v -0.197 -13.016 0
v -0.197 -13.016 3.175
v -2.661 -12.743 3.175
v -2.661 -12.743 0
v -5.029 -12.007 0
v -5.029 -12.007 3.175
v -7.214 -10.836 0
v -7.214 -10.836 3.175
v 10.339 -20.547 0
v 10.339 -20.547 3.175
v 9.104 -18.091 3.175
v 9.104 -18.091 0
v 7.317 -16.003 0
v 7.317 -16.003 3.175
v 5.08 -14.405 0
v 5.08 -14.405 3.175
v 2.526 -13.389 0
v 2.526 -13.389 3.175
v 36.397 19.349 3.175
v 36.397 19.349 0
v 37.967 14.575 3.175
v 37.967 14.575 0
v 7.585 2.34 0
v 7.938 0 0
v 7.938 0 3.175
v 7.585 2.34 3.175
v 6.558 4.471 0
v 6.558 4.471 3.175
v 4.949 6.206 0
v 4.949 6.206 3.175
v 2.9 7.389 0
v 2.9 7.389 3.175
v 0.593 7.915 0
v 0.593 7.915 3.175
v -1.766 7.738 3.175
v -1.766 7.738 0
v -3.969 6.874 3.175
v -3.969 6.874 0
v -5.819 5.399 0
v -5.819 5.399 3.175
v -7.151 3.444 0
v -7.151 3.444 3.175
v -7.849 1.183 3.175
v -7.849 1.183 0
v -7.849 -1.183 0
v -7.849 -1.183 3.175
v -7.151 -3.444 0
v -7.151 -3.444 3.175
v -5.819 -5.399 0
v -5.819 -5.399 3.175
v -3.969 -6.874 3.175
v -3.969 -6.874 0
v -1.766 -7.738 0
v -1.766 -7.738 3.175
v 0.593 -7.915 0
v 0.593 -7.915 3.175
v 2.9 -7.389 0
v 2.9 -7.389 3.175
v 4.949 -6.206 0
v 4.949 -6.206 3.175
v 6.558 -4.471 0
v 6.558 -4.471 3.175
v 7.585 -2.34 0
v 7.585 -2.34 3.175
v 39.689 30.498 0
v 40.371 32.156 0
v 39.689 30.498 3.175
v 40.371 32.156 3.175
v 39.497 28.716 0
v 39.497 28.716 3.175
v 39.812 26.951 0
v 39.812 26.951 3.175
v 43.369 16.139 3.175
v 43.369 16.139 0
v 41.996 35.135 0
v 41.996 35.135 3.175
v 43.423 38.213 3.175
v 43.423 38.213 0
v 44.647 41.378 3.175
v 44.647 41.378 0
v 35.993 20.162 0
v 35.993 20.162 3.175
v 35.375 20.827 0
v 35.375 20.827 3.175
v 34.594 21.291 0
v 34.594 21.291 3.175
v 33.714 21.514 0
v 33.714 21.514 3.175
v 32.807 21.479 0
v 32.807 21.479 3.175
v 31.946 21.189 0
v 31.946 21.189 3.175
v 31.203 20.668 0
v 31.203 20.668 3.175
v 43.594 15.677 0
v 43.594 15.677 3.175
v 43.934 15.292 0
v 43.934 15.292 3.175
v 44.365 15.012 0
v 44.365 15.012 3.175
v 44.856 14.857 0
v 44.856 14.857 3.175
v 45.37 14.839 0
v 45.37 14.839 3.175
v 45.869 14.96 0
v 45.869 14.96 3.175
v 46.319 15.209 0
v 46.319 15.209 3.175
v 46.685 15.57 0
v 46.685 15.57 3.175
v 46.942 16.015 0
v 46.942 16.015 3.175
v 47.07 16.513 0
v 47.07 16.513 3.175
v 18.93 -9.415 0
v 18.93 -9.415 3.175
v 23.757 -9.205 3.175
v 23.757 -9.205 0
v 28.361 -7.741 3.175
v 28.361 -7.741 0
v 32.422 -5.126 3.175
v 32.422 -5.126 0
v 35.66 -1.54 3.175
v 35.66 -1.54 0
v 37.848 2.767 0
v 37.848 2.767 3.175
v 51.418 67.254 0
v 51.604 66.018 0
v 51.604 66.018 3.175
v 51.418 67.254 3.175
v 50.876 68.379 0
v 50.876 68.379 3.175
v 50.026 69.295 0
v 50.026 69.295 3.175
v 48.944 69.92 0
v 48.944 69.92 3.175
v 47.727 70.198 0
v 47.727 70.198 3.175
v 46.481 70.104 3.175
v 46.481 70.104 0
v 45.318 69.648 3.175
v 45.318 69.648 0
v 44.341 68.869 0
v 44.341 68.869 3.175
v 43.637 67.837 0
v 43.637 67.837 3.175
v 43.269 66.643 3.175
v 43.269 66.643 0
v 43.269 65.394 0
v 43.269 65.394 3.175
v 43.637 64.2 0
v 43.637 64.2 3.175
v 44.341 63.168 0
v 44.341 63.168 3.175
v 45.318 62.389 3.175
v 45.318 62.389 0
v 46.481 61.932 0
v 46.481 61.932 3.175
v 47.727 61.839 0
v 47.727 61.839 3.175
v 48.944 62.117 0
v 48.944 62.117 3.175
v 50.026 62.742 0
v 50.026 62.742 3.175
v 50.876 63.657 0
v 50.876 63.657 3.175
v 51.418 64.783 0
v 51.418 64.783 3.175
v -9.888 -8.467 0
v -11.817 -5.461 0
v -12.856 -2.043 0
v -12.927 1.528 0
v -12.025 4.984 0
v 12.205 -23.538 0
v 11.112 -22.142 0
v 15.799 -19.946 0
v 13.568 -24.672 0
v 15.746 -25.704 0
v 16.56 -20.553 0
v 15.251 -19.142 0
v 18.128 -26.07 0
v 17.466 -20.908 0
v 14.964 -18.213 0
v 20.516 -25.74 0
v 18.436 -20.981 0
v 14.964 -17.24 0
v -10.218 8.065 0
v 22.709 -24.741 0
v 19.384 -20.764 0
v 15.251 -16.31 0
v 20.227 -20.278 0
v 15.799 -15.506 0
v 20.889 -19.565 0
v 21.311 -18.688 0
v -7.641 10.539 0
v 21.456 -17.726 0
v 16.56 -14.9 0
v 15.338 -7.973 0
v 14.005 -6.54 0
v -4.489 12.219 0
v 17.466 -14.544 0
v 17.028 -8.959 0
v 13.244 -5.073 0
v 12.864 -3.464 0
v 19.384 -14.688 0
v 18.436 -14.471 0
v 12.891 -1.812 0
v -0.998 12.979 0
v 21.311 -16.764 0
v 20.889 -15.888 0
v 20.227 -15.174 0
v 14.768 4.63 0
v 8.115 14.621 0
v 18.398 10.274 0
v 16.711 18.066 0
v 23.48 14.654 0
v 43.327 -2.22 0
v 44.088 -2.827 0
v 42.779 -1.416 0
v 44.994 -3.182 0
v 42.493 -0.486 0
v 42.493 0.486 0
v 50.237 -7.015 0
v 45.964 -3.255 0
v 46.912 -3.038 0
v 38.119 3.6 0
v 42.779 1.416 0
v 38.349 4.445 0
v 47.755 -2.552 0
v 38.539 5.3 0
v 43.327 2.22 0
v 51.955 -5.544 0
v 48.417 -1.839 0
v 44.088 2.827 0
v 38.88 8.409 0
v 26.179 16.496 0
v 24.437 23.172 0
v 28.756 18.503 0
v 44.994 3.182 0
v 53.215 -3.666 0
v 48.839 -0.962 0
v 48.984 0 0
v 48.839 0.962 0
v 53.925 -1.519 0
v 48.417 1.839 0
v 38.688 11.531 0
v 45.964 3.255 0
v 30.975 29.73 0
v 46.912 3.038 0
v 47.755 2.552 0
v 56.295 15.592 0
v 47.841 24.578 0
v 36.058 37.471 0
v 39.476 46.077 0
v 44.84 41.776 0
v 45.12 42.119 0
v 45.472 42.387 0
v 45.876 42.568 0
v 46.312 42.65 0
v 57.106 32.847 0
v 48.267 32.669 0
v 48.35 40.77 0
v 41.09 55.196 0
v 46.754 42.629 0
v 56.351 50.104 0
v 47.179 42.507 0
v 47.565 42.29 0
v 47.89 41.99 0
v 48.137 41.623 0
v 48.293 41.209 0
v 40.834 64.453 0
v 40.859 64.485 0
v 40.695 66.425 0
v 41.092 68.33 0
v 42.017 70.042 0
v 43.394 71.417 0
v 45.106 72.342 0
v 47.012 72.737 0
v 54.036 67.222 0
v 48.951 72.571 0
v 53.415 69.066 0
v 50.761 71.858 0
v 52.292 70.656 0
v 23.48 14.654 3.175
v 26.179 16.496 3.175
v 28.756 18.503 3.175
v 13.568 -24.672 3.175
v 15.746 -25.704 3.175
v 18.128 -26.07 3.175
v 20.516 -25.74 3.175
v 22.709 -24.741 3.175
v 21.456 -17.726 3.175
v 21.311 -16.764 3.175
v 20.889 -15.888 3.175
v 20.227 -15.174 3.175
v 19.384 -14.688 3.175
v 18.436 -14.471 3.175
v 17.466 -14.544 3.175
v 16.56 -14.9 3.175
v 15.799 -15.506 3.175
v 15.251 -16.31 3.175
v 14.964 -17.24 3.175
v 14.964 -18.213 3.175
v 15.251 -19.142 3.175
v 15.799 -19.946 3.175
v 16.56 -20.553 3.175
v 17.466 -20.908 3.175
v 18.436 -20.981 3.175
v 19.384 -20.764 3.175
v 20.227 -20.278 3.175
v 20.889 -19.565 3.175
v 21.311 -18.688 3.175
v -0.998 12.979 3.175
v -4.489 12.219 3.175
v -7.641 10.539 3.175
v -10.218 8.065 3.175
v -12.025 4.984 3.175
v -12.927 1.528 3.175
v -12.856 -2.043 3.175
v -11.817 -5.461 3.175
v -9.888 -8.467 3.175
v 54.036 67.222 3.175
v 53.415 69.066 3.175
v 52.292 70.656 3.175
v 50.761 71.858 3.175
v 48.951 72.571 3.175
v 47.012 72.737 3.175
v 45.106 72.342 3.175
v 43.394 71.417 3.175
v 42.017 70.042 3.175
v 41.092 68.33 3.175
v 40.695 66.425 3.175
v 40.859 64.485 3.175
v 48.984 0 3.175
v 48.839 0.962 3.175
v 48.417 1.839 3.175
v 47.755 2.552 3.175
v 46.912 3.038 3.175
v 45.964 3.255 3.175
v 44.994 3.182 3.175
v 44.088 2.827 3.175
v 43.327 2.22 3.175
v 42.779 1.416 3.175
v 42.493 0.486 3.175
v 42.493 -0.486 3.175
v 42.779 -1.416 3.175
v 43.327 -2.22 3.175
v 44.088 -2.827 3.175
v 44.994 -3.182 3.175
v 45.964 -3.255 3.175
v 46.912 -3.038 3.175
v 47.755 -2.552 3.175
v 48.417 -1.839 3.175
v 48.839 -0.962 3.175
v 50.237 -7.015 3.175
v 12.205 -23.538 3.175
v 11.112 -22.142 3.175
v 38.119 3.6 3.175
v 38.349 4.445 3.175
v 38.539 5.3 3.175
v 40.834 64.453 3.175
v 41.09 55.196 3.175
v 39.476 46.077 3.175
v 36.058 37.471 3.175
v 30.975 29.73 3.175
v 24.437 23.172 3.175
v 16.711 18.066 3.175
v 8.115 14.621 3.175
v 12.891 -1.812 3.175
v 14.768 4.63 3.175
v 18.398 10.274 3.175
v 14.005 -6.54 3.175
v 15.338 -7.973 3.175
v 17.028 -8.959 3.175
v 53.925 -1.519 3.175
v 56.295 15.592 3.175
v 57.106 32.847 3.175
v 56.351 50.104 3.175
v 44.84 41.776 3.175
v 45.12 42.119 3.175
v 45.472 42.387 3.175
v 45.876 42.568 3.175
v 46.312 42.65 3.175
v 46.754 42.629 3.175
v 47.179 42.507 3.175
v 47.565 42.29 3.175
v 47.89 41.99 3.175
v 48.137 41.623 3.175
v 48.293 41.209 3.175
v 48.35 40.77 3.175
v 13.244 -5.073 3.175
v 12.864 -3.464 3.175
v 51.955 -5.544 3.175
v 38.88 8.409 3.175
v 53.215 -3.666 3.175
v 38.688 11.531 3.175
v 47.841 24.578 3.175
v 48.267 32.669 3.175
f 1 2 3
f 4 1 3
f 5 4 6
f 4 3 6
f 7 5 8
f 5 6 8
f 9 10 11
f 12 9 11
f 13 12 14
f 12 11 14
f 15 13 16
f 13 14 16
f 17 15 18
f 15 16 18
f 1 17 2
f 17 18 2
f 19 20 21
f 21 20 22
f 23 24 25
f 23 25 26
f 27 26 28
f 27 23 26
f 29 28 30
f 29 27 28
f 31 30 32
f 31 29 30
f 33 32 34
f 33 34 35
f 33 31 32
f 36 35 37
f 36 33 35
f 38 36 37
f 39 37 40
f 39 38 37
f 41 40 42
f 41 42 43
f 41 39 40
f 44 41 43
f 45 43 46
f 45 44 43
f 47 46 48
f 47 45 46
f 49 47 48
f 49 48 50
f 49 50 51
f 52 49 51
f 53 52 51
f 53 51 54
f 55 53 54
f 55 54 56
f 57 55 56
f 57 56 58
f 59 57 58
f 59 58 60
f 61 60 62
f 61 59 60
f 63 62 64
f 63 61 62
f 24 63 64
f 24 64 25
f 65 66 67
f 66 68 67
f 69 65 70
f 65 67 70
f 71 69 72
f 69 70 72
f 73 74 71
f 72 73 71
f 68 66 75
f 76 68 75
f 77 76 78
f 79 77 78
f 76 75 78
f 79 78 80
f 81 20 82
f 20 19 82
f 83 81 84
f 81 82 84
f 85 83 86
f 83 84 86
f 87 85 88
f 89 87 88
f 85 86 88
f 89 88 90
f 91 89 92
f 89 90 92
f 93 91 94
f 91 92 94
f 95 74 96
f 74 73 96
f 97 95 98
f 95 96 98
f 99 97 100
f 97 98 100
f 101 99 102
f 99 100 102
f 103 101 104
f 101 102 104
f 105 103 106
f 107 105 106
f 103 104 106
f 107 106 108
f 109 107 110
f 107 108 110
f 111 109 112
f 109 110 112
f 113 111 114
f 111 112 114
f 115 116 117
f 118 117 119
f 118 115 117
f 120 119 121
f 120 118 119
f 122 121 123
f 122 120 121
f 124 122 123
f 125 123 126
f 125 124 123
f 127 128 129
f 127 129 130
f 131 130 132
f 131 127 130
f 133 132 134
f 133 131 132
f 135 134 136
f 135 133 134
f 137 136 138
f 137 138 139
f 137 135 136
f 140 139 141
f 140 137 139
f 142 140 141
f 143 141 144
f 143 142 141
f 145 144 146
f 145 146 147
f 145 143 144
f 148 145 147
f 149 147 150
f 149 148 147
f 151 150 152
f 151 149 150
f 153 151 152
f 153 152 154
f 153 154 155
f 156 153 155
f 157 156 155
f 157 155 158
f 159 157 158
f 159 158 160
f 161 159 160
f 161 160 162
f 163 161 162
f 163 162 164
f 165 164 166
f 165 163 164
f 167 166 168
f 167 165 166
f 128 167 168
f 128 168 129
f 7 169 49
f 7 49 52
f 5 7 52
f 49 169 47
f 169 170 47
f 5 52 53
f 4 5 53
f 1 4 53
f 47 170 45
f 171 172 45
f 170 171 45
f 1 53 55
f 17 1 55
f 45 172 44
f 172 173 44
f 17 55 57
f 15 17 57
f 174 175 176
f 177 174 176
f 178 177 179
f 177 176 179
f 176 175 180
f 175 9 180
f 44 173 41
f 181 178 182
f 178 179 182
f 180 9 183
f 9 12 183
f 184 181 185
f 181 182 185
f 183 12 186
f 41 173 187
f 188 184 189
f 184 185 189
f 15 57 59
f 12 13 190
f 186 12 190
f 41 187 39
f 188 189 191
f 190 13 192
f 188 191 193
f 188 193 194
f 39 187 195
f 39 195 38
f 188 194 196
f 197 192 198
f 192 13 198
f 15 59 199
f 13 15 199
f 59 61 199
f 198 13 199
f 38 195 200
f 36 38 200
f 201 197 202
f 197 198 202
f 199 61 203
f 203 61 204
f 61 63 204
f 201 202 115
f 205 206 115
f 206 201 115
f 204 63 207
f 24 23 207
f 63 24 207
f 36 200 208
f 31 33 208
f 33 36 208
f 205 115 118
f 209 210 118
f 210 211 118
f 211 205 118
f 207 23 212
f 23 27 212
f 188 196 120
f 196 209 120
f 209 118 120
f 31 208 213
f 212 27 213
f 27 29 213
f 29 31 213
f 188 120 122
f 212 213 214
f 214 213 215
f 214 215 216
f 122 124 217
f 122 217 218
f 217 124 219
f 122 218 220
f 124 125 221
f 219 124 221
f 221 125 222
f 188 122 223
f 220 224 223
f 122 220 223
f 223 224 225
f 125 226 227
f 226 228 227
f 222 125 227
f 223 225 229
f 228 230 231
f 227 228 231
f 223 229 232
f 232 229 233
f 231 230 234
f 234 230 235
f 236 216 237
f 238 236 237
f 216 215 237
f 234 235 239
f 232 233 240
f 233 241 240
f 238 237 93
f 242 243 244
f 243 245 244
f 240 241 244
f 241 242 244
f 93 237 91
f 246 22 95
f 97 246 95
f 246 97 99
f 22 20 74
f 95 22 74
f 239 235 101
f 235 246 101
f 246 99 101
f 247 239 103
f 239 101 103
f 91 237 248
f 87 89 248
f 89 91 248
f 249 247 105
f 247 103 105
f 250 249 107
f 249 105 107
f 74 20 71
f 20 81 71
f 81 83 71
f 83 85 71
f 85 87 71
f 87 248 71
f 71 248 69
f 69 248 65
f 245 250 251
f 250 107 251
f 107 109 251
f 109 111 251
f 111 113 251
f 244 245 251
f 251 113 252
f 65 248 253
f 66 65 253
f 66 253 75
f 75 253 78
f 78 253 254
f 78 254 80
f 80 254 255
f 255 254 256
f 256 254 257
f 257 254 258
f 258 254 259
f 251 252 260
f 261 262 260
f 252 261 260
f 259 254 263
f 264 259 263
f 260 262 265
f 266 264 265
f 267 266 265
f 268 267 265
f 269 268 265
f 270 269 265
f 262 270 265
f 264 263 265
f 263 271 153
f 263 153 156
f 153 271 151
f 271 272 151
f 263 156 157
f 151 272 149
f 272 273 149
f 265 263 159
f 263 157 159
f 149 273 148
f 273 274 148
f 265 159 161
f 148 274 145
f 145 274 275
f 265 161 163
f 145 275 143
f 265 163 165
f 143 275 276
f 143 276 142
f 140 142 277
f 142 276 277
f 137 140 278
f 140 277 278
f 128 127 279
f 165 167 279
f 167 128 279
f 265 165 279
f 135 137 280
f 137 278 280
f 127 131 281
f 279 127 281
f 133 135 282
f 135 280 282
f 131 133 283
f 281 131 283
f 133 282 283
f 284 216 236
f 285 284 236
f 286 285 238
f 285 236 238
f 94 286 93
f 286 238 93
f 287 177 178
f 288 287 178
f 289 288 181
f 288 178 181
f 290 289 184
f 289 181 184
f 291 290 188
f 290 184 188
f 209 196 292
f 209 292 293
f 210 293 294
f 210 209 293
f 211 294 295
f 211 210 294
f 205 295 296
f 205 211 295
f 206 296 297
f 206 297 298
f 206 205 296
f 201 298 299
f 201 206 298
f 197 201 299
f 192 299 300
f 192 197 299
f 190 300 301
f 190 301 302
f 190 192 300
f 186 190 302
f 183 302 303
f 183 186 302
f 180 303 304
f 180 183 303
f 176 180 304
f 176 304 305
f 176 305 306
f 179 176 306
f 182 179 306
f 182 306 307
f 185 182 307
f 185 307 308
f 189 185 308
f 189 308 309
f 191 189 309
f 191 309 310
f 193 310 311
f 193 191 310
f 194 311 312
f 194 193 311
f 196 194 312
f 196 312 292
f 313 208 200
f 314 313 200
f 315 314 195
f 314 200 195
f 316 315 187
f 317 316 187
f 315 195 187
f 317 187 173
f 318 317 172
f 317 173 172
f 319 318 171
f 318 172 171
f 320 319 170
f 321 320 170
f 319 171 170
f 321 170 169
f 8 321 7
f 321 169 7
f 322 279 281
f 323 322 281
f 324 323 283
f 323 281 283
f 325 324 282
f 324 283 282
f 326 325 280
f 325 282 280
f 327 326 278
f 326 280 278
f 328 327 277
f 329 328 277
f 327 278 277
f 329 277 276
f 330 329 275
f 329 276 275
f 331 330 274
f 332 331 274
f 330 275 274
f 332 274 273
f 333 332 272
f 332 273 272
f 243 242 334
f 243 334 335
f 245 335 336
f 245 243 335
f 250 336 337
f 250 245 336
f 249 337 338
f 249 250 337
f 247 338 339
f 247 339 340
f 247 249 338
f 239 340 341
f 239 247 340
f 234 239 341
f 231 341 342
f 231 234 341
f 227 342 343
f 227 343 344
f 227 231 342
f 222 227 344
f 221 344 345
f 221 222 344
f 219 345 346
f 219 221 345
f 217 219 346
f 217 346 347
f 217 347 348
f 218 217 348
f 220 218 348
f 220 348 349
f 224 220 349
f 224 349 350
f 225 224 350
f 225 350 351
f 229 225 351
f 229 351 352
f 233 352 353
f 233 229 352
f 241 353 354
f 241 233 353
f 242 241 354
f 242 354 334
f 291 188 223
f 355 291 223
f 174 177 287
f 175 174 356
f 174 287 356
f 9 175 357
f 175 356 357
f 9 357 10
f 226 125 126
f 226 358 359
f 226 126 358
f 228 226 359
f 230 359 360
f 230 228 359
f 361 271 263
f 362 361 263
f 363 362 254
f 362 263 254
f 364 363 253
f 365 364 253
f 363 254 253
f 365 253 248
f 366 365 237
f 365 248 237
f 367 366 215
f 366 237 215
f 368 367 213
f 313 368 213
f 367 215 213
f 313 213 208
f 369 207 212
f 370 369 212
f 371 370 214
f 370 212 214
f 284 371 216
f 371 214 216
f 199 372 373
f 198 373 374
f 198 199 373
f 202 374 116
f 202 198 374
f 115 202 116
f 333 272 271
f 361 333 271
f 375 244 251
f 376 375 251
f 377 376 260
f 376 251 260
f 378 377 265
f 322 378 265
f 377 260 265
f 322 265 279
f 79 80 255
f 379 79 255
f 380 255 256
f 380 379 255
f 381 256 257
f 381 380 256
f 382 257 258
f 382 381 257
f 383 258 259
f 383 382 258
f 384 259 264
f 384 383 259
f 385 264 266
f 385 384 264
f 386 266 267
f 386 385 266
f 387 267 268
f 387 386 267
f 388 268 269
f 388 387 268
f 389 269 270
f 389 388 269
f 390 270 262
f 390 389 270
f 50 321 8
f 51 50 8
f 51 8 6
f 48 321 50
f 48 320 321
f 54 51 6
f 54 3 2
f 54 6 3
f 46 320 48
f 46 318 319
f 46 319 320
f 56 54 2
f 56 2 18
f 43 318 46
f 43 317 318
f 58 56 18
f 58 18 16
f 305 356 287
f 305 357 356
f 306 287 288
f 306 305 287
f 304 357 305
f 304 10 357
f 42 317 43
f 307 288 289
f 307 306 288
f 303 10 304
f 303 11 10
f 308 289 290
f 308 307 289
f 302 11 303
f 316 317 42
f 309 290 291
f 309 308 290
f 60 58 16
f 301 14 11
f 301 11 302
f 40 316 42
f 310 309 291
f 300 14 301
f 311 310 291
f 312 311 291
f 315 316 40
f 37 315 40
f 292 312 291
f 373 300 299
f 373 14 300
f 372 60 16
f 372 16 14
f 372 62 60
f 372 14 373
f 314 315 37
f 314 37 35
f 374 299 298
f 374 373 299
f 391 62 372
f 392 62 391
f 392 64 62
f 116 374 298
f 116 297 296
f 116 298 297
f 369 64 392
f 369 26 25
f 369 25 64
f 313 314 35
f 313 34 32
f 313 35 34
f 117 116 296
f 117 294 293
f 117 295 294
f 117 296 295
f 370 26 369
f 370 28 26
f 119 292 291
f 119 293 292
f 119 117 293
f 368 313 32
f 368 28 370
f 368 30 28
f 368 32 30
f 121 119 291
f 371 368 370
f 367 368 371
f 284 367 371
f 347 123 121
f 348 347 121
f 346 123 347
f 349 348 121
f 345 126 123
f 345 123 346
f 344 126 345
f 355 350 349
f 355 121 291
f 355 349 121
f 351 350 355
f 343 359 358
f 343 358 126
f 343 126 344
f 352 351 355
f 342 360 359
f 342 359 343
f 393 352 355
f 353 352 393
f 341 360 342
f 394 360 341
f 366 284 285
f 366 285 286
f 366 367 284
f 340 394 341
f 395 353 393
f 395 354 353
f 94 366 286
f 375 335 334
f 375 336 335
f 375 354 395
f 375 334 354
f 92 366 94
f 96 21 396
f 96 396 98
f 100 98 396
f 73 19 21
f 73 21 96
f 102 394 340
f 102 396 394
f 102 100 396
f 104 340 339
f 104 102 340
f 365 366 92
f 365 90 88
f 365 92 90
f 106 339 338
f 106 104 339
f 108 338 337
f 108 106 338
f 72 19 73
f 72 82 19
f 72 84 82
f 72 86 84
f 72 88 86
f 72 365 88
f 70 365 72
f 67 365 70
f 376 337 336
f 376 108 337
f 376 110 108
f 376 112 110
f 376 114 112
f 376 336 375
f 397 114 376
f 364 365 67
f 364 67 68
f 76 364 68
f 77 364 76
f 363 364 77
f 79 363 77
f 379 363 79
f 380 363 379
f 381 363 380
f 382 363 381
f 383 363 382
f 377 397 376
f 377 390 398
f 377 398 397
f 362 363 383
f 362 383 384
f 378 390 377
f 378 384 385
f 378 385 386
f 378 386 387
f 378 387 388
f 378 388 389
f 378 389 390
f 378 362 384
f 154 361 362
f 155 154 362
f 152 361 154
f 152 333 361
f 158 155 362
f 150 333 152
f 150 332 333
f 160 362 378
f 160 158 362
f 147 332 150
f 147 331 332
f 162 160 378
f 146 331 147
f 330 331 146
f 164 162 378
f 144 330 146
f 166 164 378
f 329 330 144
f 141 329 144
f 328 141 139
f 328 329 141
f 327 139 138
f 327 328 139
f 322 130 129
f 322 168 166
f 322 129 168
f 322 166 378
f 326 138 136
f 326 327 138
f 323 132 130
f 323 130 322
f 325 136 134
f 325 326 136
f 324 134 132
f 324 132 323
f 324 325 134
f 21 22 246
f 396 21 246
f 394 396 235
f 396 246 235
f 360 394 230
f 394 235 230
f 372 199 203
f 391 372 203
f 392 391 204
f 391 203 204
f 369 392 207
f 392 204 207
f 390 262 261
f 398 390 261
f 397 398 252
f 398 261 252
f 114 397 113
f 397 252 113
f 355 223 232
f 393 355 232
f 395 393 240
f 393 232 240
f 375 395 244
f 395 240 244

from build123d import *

# Parameters (mm, degrees)
SKETCH2_R           = 7.9375
SKETCH2_R_2         = 3.2639
SKETCH2_R_3         = 4.191
BOSS_EXTRUDE1_DEPTH = 3.175
FILLET3_R           = 1.905
FILLET4_R           = 6.35
BOSS_EXTRUDE2_START = -3.175
BOSS_EXTRUDE2_DEPTH = 3.175
CUT_EXTRUDE1_DEPTH  = 12.065
FILLET5_R           = 3.175
CUT_EXTRUDE2_DEPTH  = 93.540316773


with BuildPart() as part:
    # Sketch2 → Boss-Extrude1 (new body)
    with BuildSketch(Plane.XY):
        with BuildLine():
            Line((22.709173353, -24.74146542), (50.237344688, -7.01528789))
            ThreePointArc((50.237344688, -7.01528789), (52.649254226, -4.648236557), (53.924522204, -1.51871084))
            ThreePointArc((53.924522204, -1.51871084), (57.106411985, 32.846575037), (54.035830718, 67.22198524))
            ThreePointArc((54.035830718, 67.22198524), (46.044632155, 72.608660166), (40.859194914, 64.485436554))
            Line((40.859194914, 64.485436554), (40.833827284, 64.453346951))
            ThreePointArc((40.833827284, 64.453346951), (30.975387354, 29.729811242), (-0.998479041, 12.979150429))
            ThreePointArc((-0.998479041, 12.979150429), (-12.595568055, 3.287395871), (-7.214067166, -10.835706769))
            Line((-7.214067166, -10.835706769), (13.567787564, -24.671601284))
            ThreePointArc((13.567787564, -24.671601284), (18.128061271, -26.069833859), (22.709173353, -24.74146542))
        make_face()
        Circle(SKETCH2_R, mode=Mode.SUBTRACT)
        with Locations((18.191828664, -17.726177531)):
            Circle(SKETCH2_R_2, mode=Mode.SUBTRACT)
        with Locations((45.72, 0)):
            Circle(SKETCH2_R_2, mode=Mode.SUBTRACT)
        with BuildLine():
            Line((40.584986991, 6.617553577), (21.318666843, -5.788581474))
            Line((21.318666843, -5.788581474), (11.074870198, -6.841239387))
            ThreePointArc((11.074870198, -6.841239387), (12.976194182, 1.036190528), (9.848859751, 8.512066016))
            ThreePointArc((9.848859751, 8.512066016), (23.445327069, 14.632175726), (34.749899024, 24.354640398))
            Line((34.749899024, 24.354640398), (40.584986991, 6.617553577))
        make_face(mode=Mode.SUBTRACT)
        with BuildLine():
            ThreePointArc((47.523781163, 56.501393309), (48.257752726, 32.370804269), (45.933946154, 8.34115665))
            Line((45.933946154, 8.34115665), (38.882442516, 29.775817606))
            ThreePointArc((38.882442516, 29.775817606), (45.039190515, 42.544935267), (47.523781163, 56.501393309))
        make_face(mode=Mode.SUBTRACT)
        with Locations((47.413333333, 66.018287029)):
            Circle(SKETCH2_R_3, mode=Mode.SUBTRACT)
    extrude(amount=BOSS_EXTRUDE1_DEPTH)

    # Fillet3
    fillet3_edges = [part.edges().sort_by_distance(p)[0] for p in [
        (45.933946154, 8.34115665, 1.5875),
        (47.523781163, 56.501393309, 1.5875),
    ]]
    fillet(fillet3_edges, radius=FILLET3_R)

    # Fillet4
    fillet4_edges = [part.edges().sort_by_distance(p)[0] for p in [
        (38.882442516, 29.775817606, 1.5875),
    ]]
    fillet(fillet4_edges, radius=FILLET4_R)

    # Sketch3 → Boss-Extrude2 (add)
    with BuildSketch(Plane.XY.offset(3.175).offset(BOSS_EXTRUDE2_START)):
        with BuildLine():
            ThreePointArc((37.967247274, 14.574773228), (38.850624387, 9.974362656), (38.539279751, 5.300264126))
            Line((38.539279751, 5.300264126), (40.584986991, 6.617553577))
            Line((40.584986991, 6.617553577), (37.967247274, 14.574773228))
        make_face()
        with BuildLine():
            ThreePointArc((14.005375904, -6.540099084), (13.004272705, -4.28056917), (12.890798124, -1.811802966))
            ThreePointArc((12.890798124, -1.811802966), (12.243860592, -4.42076736), (11.074870198, -6.841239387))
            Line((11.074870198, -6.841239387), (14.005375904, -6.540099084))
        make_face()
        with BuildLine():
            ThreePointArc((9.848859751, 8.512066016), (12.486736073, 3.679229335), (12.890798124, -1.811802966))
            ThreePointArc((12.890798124, -1.811802966), (16.379474961, 7.582660649), (23.480082515, 14.654307207))
            ThreePointArc((23.480082515, 14.654307207), (16.886076234, 11.091387544), (9.848859751, 8.512066016))
        make_face()
    extrude(amount=BOSS_EXTRUDE2_DEPTH)

    # Sketch4 → Cut-Extrude1 (cut)
    with BuildSketch(Plane.XY):
        with BuildLine():
            Line((38.539279751, 5.300264126), (24.727997063, 1.47053375))
            ThreePointArc((24.727997063, 1.47053375), (25.836206507, -0.508508416), (26.220294441, -2.743953008))
            ThreePointArc((26.220294441, -2.743953008), (24.044282761, -7.68479904), (18.930249644, -9.41501626))
            ThreePointArc((18.930249644, -9.41501626), (30.477911362, -6.56779892), (37.848176473, 2.766778194))
            ThreePointArc((37.848176473, 2.766778194), (38.239149826, 4.021130685), (38.539279751, 5.300264126))
        make_face()
        with BuildLine():
            ThreePointArc((24.727997063, 1.47053375), (17.733373474, 3.709866579), (12.890798123, -1.811802972))
            Line((12.890798123, -1.811802972), (24.727997063, 1.47053375))
        make_face()
        with BuildLine():
            Line((24.727997063, 1.47053375), (12.890798123, -1.811802972))
            ThreePointArc((12.890798123, -1.811802972), (14.27873169, -6.909589201), (18.930249644, -9.41501626))
            ThreePointArc((18.930249644, -9.41501626), (24.044282761, -7.68479904), (26.220294441, -2.743953008))
            ThreePointArc((26.220294441, -2.743953008), (25.836206507, -0.508508416), (24.727997063, 1.47053375))
        make_face()
    extrude(amount=CUT_EXTRUDE1_DEPTH, mode=Mode.SUBTRACT)

    # Fillet5
    fillet5_edges = [part.edges().sort_by_distance(p)[0] for p in [
        (34.749899024, 24.354640398, 1.5875),
    ]]
    fillet(fillet5_edges, radius=FILLET5_R)

    # Sketch5 → Cut-Extrude2 (cut, through all)
    with BuildSketch(Plane.XY.offset(3.175)):
        with BuildLine():
            Line((-7.214067166, -10.835706769), (-15.113040322, -22.700159224))
            Line((-15.113040322, -22.700159224), (13.567787564, -34.649979512))
            Line((13.567787564, -34.649979512), (13.567787564, -24.671601284))
            ThreePointArc((13.567787564, -24.671601284), (11.621320872, -22.869045851), (10.339065437, -20.546598936))
            ThreePointArc((10.339065437, -20.546598936), (6.247008791, -15.136046815), (-0.196937719, -13.01601021))
            ThreePointArc((-0.196937719, -13.01601021), (-3.862535324, -12.431256056), (-7.214067166, -10.835706769))
        make_face()
    extrude(amount=-CUT_EXTRUDE2_DEPTH, mode=Mode.SUBTRACT)


solid = part.part
